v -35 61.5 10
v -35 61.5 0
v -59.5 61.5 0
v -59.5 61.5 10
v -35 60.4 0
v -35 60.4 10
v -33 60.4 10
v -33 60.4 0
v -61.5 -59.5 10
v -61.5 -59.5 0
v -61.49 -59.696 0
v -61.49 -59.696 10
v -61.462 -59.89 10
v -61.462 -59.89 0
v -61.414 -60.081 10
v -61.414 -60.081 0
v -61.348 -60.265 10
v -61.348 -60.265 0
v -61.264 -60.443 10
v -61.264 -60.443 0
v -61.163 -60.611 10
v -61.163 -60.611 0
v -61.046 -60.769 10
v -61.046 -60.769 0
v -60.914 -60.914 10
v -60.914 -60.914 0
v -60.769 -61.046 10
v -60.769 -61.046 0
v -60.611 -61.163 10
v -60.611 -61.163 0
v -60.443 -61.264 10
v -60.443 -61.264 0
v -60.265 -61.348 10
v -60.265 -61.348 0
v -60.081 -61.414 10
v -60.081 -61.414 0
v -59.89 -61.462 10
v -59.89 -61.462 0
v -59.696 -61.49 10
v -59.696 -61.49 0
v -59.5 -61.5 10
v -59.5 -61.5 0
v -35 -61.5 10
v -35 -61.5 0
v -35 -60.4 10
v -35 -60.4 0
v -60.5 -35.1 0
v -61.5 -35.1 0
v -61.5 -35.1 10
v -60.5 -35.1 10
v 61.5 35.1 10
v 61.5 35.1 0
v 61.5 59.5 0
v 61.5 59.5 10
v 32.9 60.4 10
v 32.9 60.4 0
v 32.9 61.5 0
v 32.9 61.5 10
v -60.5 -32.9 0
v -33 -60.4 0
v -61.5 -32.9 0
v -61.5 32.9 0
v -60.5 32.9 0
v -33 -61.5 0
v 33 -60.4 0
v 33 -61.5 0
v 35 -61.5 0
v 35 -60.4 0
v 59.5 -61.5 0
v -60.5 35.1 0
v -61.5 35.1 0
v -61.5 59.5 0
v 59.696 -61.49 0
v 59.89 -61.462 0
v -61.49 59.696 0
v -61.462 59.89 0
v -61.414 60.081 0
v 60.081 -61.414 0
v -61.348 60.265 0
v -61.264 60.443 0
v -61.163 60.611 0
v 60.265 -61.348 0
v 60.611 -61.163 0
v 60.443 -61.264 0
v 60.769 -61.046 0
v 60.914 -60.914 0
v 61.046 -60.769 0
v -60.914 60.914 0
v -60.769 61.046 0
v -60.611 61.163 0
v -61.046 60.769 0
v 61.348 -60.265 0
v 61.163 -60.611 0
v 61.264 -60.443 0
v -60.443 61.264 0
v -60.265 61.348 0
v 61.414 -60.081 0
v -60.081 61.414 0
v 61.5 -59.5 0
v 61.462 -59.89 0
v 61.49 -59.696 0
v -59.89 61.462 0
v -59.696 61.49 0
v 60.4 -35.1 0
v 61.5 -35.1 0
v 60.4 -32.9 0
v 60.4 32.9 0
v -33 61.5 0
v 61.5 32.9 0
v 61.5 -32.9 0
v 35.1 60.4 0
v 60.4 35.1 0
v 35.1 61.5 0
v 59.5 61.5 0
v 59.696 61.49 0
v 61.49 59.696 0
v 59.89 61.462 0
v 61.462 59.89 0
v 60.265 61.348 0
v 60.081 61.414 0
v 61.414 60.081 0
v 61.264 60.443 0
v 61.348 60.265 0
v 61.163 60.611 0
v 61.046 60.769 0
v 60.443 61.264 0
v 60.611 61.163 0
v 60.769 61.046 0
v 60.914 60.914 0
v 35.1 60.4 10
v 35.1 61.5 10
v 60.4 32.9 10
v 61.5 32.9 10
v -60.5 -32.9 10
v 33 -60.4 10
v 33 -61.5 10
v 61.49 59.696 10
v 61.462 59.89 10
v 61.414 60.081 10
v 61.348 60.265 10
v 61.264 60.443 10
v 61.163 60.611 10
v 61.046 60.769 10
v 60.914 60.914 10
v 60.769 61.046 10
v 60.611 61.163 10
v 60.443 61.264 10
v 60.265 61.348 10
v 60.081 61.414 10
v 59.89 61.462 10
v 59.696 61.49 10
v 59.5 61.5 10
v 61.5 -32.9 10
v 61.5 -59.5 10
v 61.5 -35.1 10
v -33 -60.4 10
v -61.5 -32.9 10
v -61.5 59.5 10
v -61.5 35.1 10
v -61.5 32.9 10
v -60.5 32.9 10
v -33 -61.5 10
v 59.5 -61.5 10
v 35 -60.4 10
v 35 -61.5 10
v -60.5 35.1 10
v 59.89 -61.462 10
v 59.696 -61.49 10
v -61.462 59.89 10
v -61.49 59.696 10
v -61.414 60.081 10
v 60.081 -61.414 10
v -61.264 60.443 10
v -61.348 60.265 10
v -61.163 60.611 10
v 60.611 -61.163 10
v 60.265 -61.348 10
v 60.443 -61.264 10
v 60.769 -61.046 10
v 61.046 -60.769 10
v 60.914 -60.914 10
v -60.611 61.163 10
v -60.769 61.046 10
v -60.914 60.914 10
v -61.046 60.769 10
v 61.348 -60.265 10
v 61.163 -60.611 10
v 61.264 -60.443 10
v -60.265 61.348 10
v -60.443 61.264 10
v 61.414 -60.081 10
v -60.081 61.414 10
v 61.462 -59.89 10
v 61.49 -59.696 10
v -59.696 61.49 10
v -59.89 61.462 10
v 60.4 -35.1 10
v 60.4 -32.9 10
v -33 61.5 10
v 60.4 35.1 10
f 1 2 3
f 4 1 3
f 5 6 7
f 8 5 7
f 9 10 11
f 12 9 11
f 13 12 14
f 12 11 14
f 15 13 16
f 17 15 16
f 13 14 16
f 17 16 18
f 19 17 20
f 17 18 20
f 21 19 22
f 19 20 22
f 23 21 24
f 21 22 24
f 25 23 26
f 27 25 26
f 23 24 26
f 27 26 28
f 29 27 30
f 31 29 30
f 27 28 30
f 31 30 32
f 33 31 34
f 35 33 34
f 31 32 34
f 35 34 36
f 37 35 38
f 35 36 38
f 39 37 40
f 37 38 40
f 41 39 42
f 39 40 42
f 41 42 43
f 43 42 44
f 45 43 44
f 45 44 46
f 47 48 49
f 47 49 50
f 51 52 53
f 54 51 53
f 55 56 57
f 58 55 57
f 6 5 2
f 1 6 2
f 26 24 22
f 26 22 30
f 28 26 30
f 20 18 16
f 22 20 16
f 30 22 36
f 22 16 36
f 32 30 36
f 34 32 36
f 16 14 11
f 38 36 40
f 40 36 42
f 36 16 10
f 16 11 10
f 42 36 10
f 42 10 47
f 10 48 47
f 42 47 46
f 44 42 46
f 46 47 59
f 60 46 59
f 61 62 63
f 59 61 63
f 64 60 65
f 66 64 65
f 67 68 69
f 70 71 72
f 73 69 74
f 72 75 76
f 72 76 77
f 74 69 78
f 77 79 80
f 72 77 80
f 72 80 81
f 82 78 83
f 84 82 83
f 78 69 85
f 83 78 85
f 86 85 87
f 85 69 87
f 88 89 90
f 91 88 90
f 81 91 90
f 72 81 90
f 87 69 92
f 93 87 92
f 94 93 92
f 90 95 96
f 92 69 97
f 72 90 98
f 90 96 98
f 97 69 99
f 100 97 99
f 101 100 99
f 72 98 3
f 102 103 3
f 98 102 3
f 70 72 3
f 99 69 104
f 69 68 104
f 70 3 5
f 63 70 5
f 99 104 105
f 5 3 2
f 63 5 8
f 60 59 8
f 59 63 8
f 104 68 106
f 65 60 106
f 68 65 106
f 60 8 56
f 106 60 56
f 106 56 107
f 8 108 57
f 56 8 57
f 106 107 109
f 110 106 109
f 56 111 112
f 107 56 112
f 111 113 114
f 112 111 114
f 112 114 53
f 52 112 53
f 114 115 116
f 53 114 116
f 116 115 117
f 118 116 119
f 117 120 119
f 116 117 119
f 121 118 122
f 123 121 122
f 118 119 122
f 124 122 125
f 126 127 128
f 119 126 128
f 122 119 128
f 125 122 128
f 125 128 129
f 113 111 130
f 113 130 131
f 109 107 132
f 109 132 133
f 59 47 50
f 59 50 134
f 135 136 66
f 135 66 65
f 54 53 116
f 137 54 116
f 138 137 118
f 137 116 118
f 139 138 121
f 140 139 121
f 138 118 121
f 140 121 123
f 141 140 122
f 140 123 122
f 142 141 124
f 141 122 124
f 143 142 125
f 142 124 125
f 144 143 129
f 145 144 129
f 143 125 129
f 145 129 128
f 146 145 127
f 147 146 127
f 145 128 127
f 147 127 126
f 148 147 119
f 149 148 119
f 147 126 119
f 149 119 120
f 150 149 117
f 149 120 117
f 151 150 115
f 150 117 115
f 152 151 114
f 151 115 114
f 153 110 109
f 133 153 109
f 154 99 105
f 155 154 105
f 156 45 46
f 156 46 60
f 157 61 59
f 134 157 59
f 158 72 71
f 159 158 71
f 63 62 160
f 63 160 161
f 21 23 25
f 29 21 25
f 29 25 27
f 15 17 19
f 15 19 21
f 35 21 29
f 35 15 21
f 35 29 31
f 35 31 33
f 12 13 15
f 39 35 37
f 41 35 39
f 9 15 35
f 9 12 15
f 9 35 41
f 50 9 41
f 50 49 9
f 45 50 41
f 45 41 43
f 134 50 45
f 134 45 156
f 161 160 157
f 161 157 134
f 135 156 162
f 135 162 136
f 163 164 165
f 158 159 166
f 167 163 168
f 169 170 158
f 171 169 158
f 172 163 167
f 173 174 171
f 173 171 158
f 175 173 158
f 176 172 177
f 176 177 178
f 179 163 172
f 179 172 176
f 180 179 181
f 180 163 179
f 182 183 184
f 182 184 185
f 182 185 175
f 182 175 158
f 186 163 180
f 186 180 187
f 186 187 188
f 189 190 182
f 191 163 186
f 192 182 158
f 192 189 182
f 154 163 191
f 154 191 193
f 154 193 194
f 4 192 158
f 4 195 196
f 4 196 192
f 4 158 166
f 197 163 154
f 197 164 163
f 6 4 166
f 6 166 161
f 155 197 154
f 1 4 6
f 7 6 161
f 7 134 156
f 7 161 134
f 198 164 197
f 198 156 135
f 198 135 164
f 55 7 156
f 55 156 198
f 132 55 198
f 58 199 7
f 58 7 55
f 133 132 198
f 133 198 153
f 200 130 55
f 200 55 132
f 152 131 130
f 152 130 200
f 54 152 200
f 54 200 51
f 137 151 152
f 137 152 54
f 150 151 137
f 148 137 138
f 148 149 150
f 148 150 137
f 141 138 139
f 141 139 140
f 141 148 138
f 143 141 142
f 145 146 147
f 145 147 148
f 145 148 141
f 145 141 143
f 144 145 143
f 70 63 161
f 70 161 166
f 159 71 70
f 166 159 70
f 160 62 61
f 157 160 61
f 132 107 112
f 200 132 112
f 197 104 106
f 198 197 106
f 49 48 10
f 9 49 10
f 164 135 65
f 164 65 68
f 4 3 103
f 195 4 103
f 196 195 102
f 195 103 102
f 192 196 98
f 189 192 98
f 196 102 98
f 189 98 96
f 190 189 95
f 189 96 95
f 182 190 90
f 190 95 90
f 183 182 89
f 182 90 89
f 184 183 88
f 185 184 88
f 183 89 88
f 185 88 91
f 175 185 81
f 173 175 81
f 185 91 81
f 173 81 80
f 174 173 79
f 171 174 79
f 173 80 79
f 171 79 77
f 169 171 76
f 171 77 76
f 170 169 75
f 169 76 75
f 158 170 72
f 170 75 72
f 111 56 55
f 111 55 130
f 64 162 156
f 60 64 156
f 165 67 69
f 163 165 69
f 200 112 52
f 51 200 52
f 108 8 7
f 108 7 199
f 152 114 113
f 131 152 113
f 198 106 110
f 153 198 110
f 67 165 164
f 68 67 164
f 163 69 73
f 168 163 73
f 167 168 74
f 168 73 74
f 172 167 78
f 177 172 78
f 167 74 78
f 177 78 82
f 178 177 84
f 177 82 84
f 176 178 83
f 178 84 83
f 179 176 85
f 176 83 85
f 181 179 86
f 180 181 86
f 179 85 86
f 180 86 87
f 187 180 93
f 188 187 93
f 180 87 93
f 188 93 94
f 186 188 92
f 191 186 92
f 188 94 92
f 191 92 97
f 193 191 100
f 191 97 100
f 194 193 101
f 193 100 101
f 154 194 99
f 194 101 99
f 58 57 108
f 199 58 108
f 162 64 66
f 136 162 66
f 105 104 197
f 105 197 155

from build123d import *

# Parameters (mm, degrees)
F2_DEPTH = 10
F1_W     = 2
F1_H     = 2.2
F1_W_2   = 2.2
F3_DEPTH = 10


with BuildPart() as f2:
    # F0 (on Top) → F2 (new body)
    with BuildSketch(Plane.XY):
        with BuildLine():
            ThreePointArc((61.5, 59.5), (60.914214, 60.914214), (59.5, 61.5))
            Line((59.5, 61.5), (-59.5, 61.5))
            ThreePointArc((-59.5, 61.5), (-60.914214, 60.914214), (-61.5, 59.5))
            Line((-61.5, 59.5), (-61.5, -59.5))
            ThreePointArc((-61.5, -59.5), (-60.914214, -60.914214), (-59.5, -61.5))
            Line((-59.5, -61.5), (59.5, -61.5))
            ThreePointArc((59.5, -61.5), (60.914214, -60.914214), (61.5, -59.5))
            Line((61.5, -59.5), (61.5, 59.5))
        make_face()
    extrude(amount=F2_DEPTH)

    # F1 (on Top) → F3 (cut)
    with BuildSketch(Plane.XY):
        with Locations((-34, 61.5)):
            Rectangle(F1_W, F1_H)
        with Locations((34, 61.5)):
            Rectangle(F1_W_2, F1_H)
        with Locations((61.5, 34)):
            Rectangle(F1_W_2, F1_H)
        with Locations((61.5, -34)):
            Rectangle(F1_W_2, F1_H)
        with Locations((34, -61.5)):
            Rectangle(F1_W, F1_H)
        with Locations((-34, -61.5)):
            Rectangle(F1_W, F1_H)
        with Locations((-61.5, -34)):
            Rectangle(F1_W, F1_H)
        with Locations((-61.5, 34)):
            Rectangle(F1_W, F1_H)
    extrude(amount=F3_DEPTH, mode=Mode.SUBTRACT)


solid = f2.part
